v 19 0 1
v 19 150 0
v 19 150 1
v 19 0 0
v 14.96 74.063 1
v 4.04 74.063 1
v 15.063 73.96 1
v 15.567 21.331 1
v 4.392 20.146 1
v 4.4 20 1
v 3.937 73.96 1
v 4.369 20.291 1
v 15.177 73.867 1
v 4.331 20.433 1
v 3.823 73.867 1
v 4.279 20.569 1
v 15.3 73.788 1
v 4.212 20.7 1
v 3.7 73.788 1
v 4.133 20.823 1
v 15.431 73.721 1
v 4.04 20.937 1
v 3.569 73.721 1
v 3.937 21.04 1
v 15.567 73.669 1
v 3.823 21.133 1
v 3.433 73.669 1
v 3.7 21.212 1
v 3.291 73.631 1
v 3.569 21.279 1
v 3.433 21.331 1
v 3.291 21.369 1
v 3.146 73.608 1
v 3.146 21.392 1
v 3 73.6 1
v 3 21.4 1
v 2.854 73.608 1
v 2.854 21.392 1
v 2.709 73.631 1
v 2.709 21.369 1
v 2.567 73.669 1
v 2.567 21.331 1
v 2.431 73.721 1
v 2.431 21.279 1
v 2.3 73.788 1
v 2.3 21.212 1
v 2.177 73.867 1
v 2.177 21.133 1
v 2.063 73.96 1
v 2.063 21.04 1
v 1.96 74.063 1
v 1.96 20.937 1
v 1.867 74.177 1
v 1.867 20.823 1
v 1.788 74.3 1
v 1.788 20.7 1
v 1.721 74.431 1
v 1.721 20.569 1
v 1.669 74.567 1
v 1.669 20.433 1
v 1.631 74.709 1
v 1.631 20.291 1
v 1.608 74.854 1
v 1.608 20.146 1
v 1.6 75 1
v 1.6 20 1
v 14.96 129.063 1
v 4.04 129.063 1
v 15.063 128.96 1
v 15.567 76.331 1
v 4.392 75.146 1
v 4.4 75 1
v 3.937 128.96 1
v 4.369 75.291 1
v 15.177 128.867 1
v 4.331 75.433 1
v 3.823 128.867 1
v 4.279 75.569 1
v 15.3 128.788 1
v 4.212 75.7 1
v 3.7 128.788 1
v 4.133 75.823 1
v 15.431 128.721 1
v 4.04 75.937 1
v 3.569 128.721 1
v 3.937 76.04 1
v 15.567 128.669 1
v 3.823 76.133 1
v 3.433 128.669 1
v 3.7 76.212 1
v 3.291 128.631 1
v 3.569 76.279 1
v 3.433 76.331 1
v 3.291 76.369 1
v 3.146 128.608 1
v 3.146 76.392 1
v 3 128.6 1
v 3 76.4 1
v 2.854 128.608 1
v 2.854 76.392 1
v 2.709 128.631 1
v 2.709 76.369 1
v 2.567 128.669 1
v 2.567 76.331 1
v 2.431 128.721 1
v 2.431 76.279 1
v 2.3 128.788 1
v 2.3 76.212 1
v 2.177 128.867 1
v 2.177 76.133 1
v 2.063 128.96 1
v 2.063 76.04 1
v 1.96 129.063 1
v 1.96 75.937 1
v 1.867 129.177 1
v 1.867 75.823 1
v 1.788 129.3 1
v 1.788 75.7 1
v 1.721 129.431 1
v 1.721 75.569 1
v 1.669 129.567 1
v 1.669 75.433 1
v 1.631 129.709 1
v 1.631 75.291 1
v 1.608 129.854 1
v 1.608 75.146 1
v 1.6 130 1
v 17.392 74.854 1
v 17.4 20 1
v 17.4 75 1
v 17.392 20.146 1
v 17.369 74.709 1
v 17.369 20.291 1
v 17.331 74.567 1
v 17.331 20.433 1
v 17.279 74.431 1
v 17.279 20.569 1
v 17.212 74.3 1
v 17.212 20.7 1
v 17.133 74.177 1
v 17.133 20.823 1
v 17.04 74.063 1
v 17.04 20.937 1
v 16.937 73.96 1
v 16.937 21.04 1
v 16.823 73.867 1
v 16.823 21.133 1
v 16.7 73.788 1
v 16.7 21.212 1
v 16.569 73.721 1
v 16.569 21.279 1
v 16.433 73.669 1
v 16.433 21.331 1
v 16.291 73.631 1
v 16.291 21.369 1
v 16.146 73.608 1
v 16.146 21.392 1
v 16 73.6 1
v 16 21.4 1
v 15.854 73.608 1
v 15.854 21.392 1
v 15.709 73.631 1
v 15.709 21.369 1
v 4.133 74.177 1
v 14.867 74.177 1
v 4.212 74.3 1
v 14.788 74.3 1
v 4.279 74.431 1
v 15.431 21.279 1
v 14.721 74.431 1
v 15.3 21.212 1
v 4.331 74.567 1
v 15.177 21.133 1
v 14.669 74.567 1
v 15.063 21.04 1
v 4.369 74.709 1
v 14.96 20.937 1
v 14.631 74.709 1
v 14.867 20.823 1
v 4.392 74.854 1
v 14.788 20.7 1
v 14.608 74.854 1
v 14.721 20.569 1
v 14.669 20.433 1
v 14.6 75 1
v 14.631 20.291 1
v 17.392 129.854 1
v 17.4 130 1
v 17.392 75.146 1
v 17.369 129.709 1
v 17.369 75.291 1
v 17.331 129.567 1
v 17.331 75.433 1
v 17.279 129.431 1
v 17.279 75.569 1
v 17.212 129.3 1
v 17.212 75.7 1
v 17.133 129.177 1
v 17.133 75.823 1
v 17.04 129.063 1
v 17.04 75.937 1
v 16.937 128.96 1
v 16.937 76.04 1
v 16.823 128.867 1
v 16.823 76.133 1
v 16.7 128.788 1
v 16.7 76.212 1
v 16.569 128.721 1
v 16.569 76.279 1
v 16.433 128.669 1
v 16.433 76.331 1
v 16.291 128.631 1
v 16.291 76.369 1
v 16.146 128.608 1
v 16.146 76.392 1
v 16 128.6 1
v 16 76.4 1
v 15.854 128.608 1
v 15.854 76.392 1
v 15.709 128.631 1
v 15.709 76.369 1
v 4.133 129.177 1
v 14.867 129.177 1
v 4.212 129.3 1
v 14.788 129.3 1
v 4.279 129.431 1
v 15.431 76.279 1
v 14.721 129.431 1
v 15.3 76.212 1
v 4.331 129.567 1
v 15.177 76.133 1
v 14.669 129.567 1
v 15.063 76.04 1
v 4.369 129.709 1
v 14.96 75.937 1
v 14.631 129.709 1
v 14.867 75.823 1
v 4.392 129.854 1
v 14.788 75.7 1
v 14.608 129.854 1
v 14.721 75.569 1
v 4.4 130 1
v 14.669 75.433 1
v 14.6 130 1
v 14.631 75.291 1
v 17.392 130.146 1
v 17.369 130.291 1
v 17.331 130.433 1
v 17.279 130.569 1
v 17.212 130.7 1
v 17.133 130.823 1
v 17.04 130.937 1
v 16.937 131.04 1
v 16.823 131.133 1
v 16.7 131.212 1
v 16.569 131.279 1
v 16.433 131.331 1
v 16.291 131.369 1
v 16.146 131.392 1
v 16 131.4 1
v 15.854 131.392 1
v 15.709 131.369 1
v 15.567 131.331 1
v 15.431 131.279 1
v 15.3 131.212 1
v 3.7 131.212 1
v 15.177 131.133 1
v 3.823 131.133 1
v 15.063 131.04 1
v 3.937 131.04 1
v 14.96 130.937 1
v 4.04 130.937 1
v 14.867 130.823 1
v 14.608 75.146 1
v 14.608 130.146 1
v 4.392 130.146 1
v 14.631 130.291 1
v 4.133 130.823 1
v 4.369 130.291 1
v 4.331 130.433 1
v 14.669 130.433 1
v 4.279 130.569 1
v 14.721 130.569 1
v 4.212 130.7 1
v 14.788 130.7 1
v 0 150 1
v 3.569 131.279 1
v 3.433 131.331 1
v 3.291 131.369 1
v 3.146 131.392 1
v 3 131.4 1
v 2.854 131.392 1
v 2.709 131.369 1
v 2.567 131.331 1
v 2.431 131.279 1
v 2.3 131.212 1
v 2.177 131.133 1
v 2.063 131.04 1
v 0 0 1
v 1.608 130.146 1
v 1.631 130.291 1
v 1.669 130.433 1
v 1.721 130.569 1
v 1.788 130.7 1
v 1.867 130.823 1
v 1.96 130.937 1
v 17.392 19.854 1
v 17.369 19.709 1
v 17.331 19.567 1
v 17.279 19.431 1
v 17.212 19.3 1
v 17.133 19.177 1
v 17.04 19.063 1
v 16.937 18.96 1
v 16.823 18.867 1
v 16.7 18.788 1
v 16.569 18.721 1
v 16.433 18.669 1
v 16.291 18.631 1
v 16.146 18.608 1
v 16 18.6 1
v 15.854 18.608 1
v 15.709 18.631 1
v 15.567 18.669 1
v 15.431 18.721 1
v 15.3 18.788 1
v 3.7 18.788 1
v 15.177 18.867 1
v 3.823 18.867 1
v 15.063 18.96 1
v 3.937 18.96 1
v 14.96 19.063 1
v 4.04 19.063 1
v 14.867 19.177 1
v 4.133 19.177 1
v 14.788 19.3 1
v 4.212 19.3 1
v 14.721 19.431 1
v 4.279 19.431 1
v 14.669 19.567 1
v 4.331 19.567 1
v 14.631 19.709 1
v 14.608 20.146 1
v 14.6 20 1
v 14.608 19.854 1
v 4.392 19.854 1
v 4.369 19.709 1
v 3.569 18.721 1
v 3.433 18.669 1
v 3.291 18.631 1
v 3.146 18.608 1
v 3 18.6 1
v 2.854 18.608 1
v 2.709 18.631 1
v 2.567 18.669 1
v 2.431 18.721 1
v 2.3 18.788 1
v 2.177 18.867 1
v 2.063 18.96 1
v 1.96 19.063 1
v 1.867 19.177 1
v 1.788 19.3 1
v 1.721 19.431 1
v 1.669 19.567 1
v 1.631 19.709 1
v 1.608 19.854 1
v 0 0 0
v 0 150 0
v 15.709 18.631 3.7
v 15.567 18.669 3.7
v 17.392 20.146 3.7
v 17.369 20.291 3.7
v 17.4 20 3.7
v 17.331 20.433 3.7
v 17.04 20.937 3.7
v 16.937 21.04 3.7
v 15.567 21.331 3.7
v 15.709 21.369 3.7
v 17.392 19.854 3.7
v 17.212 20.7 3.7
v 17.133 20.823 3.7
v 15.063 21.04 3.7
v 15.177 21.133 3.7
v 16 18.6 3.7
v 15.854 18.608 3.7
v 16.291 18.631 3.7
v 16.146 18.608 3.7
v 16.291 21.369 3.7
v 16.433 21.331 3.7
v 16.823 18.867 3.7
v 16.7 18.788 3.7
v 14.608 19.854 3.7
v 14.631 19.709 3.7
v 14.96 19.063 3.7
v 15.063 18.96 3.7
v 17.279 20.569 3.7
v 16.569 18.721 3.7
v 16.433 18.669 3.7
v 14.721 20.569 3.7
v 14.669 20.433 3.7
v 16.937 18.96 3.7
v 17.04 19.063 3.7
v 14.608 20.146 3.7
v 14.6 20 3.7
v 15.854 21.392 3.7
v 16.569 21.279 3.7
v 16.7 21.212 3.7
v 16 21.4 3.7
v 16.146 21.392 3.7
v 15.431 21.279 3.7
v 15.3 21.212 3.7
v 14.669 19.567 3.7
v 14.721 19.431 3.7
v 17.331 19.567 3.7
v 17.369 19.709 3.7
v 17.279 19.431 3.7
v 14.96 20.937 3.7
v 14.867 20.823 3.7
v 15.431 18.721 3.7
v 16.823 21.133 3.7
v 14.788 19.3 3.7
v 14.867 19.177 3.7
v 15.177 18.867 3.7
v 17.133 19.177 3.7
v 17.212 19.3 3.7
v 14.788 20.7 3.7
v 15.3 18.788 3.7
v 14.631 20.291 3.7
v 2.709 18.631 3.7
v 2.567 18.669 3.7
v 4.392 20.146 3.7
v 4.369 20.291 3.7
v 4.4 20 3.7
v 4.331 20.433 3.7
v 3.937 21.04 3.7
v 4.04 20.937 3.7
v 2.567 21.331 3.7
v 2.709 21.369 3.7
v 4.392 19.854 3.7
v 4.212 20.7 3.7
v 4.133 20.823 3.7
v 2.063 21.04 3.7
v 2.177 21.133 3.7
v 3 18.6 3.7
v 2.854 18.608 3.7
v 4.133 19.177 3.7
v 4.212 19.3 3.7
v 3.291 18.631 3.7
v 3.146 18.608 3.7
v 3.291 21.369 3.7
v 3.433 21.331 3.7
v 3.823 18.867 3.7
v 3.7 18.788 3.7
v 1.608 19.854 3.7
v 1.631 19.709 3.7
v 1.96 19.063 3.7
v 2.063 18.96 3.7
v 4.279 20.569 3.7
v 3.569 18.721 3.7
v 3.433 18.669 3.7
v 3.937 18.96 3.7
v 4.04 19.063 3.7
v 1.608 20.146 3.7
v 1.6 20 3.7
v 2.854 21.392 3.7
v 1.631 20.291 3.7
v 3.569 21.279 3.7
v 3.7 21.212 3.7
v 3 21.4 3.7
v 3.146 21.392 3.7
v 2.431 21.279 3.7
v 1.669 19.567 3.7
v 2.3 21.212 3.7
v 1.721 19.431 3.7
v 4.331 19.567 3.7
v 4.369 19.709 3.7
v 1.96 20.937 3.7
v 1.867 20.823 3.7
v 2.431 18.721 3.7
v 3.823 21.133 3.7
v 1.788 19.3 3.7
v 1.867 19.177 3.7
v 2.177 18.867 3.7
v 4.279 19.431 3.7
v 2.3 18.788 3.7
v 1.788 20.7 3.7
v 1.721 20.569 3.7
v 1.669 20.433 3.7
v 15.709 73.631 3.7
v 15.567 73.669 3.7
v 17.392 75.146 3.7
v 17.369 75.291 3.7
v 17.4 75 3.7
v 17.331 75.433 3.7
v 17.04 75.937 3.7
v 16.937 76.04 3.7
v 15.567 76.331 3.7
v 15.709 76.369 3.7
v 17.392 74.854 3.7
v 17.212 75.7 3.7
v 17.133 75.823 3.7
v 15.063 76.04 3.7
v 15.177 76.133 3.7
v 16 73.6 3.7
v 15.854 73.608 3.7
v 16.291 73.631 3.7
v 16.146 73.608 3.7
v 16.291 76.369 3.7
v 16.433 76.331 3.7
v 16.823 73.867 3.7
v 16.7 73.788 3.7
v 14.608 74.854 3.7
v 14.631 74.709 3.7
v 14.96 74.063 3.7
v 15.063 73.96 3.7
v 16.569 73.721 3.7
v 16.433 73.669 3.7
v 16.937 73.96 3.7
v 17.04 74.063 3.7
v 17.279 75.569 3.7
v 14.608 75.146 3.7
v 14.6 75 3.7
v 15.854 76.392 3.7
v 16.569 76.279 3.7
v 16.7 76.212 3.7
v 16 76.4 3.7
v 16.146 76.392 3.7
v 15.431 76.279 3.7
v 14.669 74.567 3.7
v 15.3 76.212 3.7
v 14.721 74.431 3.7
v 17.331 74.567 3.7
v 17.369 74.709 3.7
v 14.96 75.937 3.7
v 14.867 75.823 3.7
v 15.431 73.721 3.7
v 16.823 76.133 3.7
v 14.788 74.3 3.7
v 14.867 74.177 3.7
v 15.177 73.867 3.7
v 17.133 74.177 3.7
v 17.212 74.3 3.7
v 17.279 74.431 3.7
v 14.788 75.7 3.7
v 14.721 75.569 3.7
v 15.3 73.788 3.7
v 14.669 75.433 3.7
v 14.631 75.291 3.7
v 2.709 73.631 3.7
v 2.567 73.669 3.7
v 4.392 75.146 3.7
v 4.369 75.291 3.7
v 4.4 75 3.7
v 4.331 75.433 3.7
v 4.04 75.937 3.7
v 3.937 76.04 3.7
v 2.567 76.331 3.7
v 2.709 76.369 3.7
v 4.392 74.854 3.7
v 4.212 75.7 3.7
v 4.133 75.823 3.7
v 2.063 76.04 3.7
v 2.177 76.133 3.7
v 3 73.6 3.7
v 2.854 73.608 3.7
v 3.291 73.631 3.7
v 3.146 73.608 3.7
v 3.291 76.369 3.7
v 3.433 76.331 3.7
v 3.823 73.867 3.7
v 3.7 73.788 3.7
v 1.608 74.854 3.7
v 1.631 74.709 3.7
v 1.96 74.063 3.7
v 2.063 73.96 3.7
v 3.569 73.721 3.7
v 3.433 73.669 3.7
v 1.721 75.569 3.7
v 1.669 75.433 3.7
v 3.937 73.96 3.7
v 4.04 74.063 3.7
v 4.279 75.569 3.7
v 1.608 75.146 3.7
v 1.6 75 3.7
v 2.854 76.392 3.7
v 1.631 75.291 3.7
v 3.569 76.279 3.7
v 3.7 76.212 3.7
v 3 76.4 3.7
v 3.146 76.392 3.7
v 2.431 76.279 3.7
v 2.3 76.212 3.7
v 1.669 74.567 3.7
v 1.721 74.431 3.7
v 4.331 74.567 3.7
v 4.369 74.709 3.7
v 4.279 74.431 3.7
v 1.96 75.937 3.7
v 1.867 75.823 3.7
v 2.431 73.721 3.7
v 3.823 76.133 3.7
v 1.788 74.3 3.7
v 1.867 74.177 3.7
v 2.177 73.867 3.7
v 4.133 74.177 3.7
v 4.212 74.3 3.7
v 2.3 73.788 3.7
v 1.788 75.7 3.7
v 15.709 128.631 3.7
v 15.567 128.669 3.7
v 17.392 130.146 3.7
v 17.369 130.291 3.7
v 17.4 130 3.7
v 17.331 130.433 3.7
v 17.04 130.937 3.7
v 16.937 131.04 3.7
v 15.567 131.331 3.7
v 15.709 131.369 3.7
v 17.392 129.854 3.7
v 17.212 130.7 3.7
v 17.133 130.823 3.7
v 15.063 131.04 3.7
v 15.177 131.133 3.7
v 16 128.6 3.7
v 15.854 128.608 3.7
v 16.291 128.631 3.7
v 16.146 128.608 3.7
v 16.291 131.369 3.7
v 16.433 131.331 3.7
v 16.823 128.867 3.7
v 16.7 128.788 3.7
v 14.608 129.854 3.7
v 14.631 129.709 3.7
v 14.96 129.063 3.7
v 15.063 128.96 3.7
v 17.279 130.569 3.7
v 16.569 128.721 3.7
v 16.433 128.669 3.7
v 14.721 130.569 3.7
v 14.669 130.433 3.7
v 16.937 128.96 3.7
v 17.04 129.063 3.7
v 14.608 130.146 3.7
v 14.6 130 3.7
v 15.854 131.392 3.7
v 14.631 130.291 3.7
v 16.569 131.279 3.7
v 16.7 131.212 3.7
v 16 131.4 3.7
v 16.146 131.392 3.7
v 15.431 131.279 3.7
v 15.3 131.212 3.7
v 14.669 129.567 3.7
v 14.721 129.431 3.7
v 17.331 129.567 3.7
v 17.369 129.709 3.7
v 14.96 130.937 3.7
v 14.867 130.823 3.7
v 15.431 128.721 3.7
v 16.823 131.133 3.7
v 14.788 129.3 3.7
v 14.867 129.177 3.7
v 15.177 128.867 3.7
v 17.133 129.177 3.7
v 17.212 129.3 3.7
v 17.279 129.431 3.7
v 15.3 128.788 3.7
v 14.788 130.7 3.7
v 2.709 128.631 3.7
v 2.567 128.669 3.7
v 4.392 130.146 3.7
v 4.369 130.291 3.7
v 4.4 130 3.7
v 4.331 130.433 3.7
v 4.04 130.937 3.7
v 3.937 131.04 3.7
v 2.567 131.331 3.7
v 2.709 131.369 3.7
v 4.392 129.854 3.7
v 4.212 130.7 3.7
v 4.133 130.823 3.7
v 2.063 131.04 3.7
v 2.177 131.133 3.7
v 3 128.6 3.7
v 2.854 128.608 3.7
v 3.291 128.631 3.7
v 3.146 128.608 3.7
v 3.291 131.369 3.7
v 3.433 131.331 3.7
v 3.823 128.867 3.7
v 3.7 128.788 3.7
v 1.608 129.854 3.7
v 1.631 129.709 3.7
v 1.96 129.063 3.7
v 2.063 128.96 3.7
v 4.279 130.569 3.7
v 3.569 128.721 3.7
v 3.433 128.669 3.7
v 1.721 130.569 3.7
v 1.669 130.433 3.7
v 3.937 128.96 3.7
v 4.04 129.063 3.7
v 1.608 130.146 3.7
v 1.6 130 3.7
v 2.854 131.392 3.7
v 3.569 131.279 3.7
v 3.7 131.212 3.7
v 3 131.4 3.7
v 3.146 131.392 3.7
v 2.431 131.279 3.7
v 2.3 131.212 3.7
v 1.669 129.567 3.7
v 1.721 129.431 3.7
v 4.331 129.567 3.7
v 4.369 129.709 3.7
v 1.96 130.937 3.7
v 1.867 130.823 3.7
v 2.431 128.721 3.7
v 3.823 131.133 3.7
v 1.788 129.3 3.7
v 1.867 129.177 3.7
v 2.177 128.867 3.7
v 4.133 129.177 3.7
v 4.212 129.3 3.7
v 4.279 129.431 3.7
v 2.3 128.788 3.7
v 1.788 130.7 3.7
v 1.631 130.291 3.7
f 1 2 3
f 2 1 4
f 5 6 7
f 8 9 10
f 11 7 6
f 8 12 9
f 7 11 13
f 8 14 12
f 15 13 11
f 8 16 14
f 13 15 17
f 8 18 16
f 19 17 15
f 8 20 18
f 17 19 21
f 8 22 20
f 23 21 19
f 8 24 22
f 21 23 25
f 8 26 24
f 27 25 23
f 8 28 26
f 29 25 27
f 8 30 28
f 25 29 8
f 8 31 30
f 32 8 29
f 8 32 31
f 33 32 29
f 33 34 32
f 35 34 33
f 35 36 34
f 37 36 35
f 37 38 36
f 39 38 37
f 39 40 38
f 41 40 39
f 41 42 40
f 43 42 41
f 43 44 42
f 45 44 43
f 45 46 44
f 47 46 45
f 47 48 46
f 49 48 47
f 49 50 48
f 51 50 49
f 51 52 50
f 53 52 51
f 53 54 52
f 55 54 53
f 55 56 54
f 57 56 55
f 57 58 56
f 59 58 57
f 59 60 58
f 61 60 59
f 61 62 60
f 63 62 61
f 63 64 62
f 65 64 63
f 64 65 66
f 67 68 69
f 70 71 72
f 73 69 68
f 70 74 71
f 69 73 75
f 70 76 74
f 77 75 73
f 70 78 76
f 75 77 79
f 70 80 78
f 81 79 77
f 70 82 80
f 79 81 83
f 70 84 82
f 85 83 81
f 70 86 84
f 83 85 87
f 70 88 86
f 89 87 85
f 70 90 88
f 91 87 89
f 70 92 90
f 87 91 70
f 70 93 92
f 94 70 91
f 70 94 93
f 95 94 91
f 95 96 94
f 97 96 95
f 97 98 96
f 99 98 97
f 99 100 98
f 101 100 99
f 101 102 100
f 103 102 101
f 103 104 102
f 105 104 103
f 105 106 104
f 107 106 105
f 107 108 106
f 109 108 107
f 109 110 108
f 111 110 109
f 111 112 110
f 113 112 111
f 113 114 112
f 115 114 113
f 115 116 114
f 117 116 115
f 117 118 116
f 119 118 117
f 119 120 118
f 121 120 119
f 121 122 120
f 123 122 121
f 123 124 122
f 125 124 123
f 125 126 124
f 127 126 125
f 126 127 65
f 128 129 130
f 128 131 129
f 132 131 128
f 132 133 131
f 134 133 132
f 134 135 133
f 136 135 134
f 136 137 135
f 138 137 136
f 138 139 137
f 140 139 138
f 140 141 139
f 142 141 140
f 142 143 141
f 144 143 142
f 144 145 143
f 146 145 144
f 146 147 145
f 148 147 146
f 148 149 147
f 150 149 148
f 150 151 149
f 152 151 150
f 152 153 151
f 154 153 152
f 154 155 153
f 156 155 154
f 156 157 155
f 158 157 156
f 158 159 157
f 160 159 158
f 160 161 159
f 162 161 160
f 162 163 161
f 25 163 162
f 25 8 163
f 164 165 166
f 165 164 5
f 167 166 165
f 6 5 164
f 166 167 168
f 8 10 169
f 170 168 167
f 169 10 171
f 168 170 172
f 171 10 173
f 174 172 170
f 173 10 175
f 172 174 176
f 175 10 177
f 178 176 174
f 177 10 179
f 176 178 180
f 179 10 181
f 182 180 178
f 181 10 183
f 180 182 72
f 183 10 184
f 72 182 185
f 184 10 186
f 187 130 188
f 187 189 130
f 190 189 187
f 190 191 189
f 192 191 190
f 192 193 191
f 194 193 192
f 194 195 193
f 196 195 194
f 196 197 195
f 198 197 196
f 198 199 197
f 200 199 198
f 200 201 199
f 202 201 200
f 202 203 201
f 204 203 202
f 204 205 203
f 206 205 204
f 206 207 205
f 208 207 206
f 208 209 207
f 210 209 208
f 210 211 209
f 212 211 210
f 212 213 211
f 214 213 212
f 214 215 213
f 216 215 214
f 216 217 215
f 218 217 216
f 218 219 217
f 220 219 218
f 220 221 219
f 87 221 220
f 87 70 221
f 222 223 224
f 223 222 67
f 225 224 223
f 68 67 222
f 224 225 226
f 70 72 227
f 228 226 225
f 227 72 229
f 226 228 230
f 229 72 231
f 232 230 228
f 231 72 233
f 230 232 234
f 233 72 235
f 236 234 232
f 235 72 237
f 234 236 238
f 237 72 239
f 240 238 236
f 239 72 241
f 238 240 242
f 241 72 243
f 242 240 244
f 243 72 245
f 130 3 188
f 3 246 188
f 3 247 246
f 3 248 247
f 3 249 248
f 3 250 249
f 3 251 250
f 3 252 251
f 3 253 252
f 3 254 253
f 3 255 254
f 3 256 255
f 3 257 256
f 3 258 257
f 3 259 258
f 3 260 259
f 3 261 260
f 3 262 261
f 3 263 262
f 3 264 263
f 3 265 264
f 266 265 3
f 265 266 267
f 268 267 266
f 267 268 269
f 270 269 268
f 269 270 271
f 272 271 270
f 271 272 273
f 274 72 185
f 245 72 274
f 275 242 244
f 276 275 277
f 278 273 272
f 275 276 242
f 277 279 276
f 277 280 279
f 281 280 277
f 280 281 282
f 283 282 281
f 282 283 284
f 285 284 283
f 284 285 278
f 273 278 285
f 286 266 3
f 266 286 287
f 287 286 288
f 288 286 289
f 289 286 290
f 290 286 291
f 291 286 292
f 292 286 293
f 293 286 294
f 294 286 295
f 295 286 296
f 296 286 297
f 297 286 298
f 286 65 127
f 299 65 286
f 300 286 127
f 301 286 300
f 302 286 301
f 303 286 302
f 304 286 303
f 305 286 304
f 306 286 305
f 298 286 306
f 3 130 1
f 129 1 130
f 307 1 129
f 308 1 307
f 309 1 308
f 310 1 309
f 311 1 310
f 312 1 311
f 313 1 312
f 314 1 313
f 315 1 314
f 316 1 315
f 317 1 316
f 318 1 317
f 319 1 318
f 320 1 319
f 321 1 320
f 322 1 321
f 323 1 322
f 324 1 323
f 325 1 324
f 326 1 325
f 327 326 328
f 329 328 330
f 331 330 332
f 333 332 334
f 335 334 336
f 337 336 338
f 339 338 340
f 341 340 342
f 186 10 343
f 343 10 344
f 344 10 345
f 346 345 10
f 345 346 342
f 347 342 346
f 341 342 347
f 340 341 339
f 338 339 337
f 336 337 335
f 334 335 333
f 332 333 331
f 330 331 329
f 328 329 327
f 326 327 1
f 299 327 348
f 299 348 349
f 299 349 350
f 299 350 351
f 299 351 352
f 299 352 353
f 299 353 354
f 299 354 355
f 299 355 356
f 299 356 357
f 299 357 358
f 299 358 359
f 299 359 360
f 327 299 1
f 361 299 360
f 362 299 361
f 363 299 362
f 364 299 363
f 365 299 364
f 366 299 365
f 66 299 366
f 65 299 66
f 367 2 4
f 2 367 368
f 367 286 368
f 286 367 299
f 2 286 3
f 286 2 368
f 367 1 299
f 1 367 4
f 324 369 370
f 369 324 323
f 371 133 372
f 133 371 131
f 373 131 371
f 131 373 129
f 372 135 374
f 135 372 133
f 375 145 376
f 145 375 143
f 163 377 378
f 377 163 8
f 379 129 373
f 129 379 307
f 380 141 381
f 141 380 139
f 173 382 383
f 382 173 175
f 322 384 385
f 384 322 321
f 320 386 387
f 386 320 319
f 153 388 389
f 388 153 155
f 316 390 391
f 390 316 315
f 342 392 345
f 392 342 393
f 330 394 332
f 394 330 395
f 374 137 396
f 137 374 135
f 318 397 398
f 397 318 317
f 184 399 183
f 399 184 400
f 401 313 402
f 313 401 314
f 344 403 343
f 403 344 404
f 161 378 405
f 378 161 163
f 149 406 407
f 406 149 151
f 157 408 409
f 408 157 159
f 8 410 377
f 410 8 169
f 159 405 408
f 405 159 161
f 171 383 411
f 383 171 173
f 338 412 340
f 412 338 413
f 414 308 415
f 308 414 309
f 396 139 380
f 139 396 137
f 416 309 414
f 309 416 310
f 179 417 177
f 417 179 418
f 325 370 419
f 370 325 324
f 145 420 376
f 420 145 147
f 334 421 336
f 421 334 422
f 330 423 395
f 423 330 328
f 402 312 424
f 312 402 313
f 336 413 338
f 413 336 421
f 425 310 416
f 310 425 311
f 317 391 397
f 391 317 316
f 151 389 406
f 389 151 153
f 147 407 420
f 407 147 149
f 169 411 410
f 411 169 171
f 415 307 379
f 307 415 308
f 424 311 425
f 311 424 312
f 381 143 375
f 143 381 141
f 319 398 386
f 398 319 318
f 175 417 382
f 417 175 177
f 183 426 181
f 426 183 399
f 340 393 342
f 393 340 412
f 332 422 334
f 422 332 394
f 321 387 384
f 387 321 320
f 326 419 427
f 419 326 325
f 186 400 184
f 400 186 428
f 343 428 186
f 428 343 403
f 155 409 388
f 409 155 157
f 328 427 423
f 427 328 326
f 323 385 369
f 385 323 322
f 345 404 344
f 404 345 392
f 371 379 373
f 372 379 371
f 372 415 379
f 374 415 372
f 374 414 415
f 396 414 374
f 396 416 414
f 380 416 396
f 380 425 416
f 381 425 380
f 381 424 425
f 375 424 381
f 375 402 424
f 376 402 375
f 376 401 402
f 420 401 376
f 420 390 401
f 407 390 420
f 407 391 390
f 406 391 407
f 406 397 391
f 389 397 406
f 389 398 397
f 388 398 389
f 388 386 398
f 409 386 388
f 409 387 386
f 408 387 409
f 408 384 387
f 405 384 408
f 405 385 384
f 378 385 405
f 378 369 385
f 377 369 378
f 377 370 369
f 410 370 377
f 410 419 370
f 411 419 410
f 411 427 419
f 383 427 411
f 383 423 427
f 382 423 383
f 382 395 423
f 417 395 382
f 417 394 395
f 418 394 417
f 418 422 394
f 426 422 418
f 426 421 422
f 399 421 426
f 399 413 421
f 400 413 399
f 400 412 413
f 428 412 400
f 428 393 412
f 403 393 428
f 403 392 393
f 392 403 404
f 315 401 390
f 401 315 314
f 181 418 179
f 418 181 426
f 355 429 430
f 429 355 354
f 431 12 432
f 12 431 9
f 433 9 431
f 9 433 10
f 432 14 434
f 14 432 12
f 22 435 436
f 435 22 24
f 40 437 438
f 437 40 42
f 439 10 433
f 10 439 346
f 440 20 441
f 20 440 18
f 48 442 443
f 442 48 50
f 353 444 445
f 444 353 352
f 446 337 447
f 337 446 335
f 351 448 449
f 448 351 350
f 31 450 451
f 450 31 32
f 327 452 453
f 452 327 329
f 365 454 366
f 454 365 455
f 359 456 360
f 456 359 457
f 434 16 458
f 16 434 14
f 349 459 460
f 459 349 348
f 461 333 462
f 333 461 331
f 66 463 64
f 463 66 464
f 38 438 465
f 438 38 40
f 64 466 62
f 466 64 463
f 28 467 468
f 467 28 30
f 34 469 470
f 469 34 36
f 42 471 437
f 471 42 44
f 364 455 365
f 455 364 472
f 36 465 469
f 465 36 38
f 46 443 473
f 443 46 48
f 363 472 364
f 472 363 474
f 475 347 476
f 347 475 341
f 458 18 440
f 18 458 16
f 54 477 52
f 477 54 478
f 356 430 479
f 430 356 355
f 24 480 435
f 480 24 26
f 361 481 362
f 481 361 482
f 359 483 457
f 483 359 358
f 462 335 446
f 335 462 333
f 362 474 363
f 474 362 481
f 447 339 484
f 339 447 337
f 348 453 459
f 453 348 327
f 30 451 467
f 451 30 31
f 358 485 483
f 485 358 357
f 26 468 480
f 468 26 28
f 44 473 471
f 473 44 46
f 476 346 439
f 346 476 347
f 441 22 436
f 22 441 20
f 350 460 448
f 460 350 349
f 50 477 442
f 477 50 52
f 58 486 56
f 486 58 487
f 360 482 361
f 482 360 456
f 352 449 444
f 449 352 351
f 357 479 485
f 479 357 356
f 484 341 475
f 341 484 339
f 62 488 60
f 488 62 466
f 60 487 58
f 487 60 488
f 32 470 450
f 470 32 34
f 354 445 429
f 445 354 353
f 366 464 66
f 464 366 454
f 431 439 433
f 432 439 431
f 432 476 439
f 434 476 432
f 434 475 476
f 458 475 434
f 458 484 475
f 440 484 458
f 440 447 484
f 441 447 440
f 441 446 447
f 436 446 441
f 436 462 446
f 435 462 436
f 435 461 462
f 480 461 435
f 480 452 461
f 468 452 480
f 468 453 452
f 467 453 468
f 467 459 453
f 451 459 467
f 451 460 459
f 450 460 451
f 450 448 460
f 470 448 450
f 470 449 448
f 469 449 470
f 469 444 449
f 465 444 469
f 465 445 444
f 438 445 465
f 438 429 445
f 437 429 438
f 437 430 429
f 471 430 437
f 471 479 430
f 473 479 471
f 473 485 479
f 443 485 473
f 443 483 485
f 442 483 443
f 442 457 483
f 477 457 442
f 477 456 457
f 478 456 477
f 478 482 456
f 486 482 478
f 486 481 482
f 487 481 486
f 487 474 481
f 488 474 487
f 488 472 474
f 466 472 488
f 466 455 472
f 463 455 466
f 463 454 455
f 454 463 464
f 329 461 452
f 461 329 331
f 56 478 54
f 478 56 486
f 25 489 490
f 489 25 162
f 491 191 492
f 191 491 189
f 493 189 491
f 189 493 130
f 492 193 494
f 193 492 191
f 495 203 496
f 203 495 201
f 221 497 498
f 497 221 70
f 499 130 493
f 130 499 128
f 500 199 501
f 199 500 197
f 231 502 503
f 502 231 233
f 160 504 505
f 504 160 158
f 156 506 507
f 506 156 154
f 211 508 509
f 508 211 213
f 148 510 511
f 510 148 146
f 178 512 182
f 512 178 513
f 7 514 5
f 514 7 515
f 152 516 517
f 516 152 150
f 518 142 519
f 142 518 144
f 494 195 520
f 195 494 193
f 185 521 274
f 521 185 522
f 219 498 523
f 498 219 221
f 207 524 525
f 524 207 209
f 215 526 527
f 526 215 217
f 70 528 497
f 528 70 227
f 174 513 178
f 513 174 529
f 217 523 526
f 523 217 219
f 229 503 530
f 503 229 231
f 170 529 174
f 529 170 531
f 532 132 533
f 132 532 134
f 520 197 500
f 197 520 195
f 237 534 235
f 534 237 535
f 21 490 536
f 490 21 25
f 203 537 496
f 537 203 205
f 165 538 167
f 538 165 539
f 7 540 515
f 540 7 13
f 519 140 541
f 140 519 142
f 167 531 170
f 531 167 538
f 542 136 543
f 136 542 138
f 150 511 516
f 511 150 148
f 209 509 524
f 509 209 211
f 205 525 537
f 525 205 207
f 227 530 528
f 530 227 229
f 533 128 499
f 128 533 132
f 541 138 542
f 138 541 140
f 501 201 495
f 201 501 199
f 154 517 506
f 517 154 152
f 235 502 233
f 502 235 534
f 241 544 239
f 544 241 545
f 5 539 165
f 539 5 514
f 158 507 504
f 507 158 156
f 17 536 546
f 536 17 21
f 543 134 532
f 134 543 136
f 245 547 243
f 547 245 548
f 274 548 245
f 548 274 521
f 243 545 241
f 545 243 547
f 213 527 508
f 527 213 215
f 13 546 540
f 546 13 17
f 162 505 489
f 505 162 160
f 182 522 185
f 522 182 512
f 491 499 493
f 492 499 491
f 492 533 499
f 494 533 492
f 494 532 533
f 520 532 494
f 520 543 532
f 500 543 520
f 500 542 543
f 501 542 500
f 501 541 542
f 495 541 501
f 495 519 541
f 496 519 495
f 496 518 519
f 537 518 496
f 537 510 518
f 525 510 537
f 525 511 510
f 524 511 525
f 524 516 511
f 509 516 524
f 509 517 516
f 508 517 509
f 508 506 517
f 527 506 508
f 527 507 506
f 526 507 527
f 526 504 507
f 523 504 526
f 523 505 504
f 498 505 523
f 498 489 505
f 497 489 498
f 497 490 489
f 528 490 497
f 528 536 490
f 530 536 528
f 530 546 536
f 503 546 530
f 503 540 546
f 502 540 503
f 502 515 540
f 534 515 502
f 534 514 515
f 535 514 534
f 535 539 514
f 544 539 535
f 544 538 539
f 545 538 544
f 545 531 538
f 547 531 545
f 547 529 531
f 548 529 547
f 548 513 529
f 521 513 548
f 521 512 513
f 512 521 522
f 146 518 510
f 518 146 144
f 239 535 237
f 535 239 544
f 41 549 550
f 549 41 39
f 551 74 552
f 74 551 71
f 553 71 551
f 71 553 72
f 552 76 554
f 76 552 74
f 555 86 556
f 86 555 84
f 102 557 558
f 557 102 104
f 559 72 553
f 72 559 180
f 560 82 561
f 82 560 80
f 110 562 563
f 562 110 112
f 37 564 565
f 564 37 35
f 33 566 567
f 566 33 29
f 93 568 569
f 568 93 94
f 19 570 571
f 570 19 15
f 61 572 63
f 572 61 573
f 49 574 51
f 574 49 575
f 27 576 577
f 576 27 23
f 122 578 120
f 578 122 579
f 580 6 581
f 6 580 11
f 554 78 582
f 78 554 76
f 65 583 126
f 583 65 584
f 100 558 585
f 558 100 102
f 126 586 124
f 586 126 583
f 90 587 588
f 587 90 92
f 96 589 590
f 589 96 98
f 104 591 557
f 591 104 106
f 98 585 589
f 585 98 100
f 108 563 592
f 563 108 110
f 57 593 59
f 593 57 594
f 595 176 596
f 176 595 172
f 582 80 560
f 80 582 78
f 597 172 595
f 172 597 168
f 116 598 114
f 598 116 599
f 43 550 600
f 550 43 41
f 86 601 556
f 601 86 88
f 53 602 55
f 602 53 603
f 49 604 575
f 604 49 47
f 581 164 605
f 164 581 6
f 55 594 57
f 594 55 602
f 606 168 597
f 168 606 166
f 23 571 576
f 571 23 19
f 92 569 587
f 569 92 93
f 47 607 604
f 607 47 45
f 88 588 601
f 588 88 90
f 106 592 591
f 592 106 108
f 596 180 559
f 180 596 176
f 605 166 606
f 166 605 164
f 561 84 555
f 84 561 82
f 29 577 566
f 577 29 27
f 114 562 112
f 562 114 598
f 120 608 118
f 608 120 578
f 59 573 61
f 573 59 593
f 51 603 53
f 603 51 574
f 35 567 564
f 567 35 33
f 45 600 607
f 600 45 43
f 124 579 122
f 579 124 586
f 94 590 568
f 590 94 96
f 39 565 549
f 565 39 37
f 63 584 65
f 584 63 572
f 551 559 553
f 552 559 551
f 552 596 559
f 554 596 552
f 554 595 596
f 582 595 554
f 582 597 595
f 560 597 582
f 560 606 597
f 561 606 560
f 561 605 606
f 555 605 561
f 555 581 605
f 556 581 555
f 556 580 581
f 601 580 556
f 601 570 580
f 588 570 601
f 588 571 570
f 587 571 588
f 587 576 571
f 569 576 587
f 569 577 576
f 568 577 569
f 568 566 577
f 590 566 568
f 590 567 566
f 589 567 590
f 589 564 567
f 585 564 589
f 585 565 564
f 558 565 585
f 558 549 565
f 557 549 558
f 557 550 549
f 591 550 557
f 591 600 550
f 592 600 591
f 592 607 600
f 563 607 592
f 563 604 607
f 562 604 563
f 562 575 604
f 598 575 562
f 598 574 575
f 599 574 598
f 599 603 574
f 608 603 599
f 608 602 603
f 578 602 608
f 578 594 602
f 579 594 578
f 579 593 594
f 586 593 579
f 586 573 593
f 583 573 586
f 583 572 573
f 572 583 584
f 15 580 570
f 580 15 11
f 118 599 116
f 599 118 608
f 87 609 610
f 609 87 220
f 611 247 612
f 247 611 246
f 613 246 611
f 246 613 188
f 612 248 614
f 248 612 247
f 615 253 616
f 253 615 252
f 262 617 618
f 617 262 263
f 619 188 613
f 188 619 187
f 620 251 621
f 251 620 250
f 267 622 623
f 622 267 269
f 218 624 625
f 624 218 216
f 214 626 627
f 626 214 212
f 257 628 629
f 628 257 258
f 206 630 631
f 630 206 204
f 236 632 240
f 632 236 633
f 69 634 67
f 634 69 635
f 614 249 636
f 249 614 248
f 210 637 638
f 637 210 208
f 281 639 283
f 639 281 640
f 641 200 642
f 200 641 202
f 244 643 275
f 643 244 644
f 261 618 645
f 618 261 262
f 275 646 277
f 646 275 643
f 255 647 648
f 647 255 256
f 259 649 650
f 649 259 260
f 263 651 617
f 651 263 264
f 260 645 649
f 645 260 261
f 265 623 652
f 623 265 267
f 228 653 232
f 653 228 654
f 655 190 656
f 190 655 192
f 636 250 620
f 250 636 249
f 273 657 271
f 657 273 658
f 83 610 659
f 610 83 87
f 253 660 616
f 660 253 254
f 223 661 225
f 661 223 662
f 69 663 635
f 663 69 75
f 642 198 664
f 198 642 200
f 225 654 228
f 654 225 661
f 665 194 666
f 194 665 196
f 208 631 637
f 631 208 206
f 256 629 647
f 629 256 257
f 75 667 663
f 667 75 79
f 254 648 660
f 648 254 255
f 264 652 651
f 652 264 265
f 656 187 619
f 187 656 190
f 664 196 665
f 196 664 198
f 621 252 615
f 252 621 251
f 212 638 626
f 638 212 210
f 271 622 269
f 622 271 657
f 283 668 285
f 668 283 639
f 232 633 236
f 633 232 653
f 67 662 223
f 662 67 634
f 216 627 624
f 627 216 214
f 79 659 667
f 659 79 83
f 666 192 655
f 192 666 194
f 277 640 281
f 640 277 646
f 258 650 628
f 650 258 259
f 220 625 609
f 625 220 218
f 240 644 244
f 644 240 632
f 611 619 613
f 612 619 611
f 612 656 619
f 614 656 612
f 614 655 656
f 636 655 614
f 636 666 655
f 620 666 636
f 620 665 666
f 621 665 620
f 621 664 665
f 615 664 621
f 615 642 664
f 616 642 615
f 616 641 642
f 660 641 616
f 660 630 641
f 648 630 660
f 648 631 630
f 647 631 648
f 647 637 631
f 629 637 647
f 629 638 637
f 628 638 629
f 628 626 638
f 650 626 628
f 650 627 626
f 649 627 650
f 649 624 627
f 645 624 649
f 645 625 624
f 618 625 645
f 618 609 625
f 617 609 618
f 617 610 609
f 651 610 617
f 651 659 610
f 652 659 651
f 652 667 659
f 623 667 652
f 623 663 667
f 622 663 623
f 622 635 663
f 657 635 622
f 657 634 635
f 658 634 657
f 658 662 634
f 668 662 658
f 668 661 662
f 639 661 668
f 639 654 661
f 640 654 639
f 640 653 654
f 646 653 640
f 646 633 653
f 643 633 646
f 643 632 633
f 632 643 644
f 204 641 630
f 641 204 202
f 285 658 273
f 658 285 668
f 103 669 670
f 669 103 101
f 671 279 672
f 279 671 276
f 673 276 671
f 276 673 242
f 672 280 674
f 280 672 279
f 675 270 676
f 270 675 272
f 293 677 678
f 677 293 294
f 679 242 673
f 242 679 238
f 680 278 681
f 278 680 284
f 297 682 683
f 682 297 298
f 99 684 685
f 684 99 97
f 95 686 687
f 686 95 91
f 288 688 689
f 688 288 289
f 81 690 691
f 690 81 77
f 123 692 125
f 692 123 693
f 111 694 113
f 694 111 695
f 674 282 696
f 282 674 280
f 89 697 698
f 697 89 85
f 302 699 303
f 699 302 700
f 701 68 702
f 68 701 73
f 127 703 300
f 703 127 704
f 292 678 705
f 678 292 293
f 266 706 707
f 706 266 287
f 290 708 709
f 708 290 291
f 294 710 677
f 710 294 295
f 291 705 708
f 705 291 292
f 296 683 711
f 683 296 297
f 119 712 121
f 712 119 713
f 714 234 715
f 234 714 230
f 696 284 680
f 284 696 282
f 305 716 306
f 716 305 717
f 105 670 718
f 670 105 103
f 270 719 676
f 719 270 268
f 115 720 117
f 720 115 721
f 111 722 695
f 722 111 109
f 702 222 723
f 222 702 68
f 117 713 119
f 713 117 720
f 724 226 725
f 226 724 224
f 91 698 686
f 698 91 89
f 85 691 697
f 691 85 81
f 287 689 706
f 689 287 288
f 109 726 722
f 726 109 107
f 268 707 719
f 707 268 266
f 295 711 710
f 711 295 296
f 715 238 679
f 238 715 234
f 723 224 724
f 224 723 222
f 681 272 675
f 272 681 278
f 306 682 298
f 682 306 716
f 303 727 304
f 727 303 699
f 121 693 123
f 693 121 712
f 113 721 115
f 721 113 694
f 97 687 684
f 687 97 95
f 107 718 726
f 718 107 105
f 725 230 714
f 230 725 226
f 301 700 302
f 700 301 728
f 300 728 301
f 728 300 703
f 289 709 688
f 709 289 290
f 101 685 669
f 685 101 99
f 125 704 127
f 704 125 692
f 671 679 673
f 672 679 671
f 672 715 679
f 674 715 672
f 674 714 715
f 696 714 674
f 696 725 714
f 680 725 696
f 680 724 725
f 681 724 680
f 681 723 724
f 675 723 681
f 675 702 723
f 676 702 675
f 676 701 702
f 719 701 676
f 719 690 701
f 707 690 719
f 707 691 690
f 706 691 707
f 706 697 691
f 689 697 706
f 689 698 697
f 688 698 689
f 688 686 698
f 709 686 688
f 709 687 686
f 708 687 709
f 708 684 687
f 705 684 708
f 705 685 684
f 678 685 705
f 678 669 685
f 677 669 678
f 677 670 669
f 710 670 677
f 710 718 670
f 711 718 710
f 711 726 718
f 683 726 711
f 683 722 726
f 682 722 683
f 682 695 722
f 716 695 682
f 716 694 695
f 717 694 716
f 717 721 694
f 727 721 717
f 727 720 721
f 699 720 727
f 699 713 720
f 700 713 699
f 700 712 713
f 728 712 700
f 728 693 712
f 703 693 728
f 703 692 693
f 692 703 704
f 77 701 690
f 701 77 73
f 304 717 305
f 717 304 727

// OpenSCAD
// file: ../Parts/Vruty.scad
$fn = 30;

module otvorVrut(dlzka, priemer, hlavaPriemer, hlavaVyska, zapustenie=2) {
    union() {
        cylinder(h = dlzka, d = priemer);
        cylinder(h = hlavaVyska, d1 = hlavaPriemer, d2 = priemer);
        translate([0,0,-zapustenie]) cylinder(h = zapustenie, d = hlavaPriemer);
    }
}

module otvorVrut4mm(dlzka = 20, zapustenie=2) {
    otvorVrut(dlzka, priemer = 3.4, hlavaPriemer = 8.5, hlavaVyska = 3.2, zapustenie=zapustenie);
}

module otvorVrut3_5mm(dlzka = 20, zapustenie=2) {
    otvorVrut(dlzka, priemer = 2.9, hlavaPriemer = 7.5, hlavaVyska = 3, zapustenie=zapustenie);
}

module otvorVrut3mm(dlzka = 20, zapustenie=2) {
    otvorVrut(dlzka, priemer = 2.4, hlavaPriemer = 6.4, hlavaVyska = 2.2, zapustenie=zapustenie);
}

module testBlok() {
    difference() {
        translate([-8,-6,0]) cube([40,21,7]);

        translate([0,13,0]) union() {
            otvorVrut4mm();
            translate([12, 0, 0]) otvorVrut3_5mm();
            translate([24, 0, 0]) otvorVrut3mm();

        }

        union() {
            otvorVrut4mm();
            translate([12, 0, 0]) otvorVrut3_5mm();
            translate([24, 0, 0]) otvorVrut3mm();
        }
    }
}

testBlok();
// main file
use <../Parts/Vruty.scad>

// 70 - výška predná doska
// 69 - výška bočné dosky

// zarazka 52mm na docentrovenie bokov
module zarazka_boky() {
    difference() {
        cube([35, 30, 57]);
        cube([30, 30, 52]);
        translate([15, 15, 57])
            rotate([180, 0, 0]) otvorVrut3mm();
        translate([35, 15, 25])
            rotate([0, - 90, 0]) otvorVrut3mm();
    }
}

module forma_front_nohy() {
    offset = 52;
    otvor1 = offset + 21 + 15;
    otvor2 = offset + 21 + 35;
    vyska_inner = offset + 70;
    vyska_outer = vyska_inner + 5;

    difference() {
        cube([35, 20, vyska_outer]);
        cube([30, 20, vyska_inner]);
        translate([15, 10, vyska_outer])
            rotate([180, 0, 0]) otvorVrut3mm();
        translate([36, 10, vyska_inner - 20])
            rotate([0, - 90, 0]) otvorVrut3mm();
        translate([36, 10, 60])
            rotate([0, - 90, 0]) otvorVrut3mm();
        translate([36, 10, 4])
            rotate([0, - 90, 0]) otvorVrut3mm();

        translate([25, 10, vyska_inner - otvor1]) rotate([0, 90, 0]) cylinder(h = 20, d = 8.5);
        translate([25, 10, vyska_inner - otvor2]) rotate([0, 90, 0]) cylinder(h = 20, d = 8.5);
    }
}


module forma_front_doska() {
    korekciaVyska = 0.2;
    korekciaSirka = 0;
    vyska = 70 + 2 * korekciaVyska;
    sirka = 20 + 2 * korekciaSirka;
    o1 = 21 + 15;
    o2 = 21 + 35;

    difference() {
        cube([24, 30, 80]);
        translate([0, 5 - korekciaSirka, 5 - korekciaVyska]) cube([20, sirka, vyska]);

        translate([31, 15, 52])
            rotate([0, - 90, 0]) otvorVrut3mm();

        translate([10, 15, vyska - o1 - korekciaVyska + 5])
            rotate([0, 90, 0]) cylinder(h = 20, d = 8.5);
        translate([10, 15, vyska - o2 - korekciaVyska + 5]) rotate([0, 90, 0]) cylinder(h = 20, d = 8.5);
    }
}

module dowel() {
    union() {
        translate([0, 0, 0.4]) cylinder(h = 8, d = 8);
        cylinder(h = 8, d = 7.6);
    }

}

// Vpravo 57
// Vlavo 55
module konzola_zadna_doska_vlavo(vyska = 55) {
    difference() {
        union() {
            cube([20, 6.5, vyska + 3]);
            cube([23, 20, 3]);
            translate([20, 0, 0]) cube([3, 20, 20]);
        }
        translate([10, 5, 20]) rotate([90, 0, 0]) otvorVrut3_5mm();
        translate([10, 5, 40]) rotate([90, 0, 0]) otvorVrut3_5mm();
    }
}

module konzola_zadna_doska_vpravo(vyska = 57) {
    mirror([1, 0, 0])
        konzola_zadna_doska_vlavo(vyska = vyska);
}

// hore 15, dole 20, vyska 35
module bocne_podpory(dlzka = 150) {
    difference() {
        hull() {
            cube([10, dlzka, 35]);
            translate([19, 0, 1]) rotate([- 90, 0, 0]) cylinder(r = 1, h = dlzka);
            translate([14, 0, 34]) rotate([- 90, 0, 0]) cylinder(r = 1, h = dlzka);
        }
        translate([4, 30, 17]) rotate([0, - 90, 0]) otvorVrut3_5mm(zapustenie = 20);
        translate([4, dlzka - 30, 17]) rotate([0, - 90, 0]) otvorVrut3_5mm(zapustenie = 20);
        //        translate([7,0,1.5]) rotate([-90,0,0]) cylinder(d=4, h=dlzka);
        //        translate([12,0,1]) rotate([-90,0,0]) cylinder(d=3, h=dlzka);
        //        translate([16,20,0]) cylinder(d=3, h=3);
        //        translate([3,20,0]) cylinder(d=3, h=3);
        //        translate([16,75,0]) cylinder(d=3, h=3);
        //        translate([3,75,0]) cylinder(d=3, h=3);
        //        translate([16,130,0]) cylinder(d=3, h=3);
        //        translate([3,130,0]) cylinder(d=3, h=3);
    }
}

module krytka_kable(priemer=2.8, vyska=2.7, dlzka = 150) {
    zakladna = 1;
    translate([0,0,0]) cube([19, dlzka, zakladna]);


    translate([16, 20, zakladna]) cylinder(d1 = priemer, d2=priemer, h = vyska);
    translate([3, 20, zakladna]) cylinder(d1 = priemer, d2=priemer, h = vyska);
    translate([16, 75, zakladna]) cylinder(d1 = priemer, d2=priemer, h = vyska);
    translate([3, 75, zakladna]) cylinder(d1 = priemer, d2=priemer, h = vyska);
    translate([16, 130, zakladna]) cylinder(d1 = priemer, d2=priemer, h = vyska);
    translate([3, 130, zakladna]) cylinder(d1 = priemer, d2=priemer, h = vyska);

}

module krytka_kable_short(priemer=2.8, vyska=2.8) {
    translate([1,0,0]) cube([18, 10, 0.56]);
    translate([16, 5, 0]) cylinder(d1 = priemer, d2=priemer-0.1, h = vyska);
    translate([3, 5, 0]) cylinder(d1 = priemer, d2=priemer-0.1, h = vyska);
}


$fn = 60;

//zarazka_boky();
//forma_front_nohy();
//forma_front_doska();
//dowel();
//konzola_zadna_doska_vlavo();
//translate([60,0,0]) konzola_zadna_doska_vpravo();
//bocne_podpory();
krytka_kable();
//translate([0,0,0]) krytka_kable_short();
//translate([30,0,0]) krytka_kable_short(priemer=2.9);
//translate([60,0,0]) krytka_kable_short(priemer=3);
